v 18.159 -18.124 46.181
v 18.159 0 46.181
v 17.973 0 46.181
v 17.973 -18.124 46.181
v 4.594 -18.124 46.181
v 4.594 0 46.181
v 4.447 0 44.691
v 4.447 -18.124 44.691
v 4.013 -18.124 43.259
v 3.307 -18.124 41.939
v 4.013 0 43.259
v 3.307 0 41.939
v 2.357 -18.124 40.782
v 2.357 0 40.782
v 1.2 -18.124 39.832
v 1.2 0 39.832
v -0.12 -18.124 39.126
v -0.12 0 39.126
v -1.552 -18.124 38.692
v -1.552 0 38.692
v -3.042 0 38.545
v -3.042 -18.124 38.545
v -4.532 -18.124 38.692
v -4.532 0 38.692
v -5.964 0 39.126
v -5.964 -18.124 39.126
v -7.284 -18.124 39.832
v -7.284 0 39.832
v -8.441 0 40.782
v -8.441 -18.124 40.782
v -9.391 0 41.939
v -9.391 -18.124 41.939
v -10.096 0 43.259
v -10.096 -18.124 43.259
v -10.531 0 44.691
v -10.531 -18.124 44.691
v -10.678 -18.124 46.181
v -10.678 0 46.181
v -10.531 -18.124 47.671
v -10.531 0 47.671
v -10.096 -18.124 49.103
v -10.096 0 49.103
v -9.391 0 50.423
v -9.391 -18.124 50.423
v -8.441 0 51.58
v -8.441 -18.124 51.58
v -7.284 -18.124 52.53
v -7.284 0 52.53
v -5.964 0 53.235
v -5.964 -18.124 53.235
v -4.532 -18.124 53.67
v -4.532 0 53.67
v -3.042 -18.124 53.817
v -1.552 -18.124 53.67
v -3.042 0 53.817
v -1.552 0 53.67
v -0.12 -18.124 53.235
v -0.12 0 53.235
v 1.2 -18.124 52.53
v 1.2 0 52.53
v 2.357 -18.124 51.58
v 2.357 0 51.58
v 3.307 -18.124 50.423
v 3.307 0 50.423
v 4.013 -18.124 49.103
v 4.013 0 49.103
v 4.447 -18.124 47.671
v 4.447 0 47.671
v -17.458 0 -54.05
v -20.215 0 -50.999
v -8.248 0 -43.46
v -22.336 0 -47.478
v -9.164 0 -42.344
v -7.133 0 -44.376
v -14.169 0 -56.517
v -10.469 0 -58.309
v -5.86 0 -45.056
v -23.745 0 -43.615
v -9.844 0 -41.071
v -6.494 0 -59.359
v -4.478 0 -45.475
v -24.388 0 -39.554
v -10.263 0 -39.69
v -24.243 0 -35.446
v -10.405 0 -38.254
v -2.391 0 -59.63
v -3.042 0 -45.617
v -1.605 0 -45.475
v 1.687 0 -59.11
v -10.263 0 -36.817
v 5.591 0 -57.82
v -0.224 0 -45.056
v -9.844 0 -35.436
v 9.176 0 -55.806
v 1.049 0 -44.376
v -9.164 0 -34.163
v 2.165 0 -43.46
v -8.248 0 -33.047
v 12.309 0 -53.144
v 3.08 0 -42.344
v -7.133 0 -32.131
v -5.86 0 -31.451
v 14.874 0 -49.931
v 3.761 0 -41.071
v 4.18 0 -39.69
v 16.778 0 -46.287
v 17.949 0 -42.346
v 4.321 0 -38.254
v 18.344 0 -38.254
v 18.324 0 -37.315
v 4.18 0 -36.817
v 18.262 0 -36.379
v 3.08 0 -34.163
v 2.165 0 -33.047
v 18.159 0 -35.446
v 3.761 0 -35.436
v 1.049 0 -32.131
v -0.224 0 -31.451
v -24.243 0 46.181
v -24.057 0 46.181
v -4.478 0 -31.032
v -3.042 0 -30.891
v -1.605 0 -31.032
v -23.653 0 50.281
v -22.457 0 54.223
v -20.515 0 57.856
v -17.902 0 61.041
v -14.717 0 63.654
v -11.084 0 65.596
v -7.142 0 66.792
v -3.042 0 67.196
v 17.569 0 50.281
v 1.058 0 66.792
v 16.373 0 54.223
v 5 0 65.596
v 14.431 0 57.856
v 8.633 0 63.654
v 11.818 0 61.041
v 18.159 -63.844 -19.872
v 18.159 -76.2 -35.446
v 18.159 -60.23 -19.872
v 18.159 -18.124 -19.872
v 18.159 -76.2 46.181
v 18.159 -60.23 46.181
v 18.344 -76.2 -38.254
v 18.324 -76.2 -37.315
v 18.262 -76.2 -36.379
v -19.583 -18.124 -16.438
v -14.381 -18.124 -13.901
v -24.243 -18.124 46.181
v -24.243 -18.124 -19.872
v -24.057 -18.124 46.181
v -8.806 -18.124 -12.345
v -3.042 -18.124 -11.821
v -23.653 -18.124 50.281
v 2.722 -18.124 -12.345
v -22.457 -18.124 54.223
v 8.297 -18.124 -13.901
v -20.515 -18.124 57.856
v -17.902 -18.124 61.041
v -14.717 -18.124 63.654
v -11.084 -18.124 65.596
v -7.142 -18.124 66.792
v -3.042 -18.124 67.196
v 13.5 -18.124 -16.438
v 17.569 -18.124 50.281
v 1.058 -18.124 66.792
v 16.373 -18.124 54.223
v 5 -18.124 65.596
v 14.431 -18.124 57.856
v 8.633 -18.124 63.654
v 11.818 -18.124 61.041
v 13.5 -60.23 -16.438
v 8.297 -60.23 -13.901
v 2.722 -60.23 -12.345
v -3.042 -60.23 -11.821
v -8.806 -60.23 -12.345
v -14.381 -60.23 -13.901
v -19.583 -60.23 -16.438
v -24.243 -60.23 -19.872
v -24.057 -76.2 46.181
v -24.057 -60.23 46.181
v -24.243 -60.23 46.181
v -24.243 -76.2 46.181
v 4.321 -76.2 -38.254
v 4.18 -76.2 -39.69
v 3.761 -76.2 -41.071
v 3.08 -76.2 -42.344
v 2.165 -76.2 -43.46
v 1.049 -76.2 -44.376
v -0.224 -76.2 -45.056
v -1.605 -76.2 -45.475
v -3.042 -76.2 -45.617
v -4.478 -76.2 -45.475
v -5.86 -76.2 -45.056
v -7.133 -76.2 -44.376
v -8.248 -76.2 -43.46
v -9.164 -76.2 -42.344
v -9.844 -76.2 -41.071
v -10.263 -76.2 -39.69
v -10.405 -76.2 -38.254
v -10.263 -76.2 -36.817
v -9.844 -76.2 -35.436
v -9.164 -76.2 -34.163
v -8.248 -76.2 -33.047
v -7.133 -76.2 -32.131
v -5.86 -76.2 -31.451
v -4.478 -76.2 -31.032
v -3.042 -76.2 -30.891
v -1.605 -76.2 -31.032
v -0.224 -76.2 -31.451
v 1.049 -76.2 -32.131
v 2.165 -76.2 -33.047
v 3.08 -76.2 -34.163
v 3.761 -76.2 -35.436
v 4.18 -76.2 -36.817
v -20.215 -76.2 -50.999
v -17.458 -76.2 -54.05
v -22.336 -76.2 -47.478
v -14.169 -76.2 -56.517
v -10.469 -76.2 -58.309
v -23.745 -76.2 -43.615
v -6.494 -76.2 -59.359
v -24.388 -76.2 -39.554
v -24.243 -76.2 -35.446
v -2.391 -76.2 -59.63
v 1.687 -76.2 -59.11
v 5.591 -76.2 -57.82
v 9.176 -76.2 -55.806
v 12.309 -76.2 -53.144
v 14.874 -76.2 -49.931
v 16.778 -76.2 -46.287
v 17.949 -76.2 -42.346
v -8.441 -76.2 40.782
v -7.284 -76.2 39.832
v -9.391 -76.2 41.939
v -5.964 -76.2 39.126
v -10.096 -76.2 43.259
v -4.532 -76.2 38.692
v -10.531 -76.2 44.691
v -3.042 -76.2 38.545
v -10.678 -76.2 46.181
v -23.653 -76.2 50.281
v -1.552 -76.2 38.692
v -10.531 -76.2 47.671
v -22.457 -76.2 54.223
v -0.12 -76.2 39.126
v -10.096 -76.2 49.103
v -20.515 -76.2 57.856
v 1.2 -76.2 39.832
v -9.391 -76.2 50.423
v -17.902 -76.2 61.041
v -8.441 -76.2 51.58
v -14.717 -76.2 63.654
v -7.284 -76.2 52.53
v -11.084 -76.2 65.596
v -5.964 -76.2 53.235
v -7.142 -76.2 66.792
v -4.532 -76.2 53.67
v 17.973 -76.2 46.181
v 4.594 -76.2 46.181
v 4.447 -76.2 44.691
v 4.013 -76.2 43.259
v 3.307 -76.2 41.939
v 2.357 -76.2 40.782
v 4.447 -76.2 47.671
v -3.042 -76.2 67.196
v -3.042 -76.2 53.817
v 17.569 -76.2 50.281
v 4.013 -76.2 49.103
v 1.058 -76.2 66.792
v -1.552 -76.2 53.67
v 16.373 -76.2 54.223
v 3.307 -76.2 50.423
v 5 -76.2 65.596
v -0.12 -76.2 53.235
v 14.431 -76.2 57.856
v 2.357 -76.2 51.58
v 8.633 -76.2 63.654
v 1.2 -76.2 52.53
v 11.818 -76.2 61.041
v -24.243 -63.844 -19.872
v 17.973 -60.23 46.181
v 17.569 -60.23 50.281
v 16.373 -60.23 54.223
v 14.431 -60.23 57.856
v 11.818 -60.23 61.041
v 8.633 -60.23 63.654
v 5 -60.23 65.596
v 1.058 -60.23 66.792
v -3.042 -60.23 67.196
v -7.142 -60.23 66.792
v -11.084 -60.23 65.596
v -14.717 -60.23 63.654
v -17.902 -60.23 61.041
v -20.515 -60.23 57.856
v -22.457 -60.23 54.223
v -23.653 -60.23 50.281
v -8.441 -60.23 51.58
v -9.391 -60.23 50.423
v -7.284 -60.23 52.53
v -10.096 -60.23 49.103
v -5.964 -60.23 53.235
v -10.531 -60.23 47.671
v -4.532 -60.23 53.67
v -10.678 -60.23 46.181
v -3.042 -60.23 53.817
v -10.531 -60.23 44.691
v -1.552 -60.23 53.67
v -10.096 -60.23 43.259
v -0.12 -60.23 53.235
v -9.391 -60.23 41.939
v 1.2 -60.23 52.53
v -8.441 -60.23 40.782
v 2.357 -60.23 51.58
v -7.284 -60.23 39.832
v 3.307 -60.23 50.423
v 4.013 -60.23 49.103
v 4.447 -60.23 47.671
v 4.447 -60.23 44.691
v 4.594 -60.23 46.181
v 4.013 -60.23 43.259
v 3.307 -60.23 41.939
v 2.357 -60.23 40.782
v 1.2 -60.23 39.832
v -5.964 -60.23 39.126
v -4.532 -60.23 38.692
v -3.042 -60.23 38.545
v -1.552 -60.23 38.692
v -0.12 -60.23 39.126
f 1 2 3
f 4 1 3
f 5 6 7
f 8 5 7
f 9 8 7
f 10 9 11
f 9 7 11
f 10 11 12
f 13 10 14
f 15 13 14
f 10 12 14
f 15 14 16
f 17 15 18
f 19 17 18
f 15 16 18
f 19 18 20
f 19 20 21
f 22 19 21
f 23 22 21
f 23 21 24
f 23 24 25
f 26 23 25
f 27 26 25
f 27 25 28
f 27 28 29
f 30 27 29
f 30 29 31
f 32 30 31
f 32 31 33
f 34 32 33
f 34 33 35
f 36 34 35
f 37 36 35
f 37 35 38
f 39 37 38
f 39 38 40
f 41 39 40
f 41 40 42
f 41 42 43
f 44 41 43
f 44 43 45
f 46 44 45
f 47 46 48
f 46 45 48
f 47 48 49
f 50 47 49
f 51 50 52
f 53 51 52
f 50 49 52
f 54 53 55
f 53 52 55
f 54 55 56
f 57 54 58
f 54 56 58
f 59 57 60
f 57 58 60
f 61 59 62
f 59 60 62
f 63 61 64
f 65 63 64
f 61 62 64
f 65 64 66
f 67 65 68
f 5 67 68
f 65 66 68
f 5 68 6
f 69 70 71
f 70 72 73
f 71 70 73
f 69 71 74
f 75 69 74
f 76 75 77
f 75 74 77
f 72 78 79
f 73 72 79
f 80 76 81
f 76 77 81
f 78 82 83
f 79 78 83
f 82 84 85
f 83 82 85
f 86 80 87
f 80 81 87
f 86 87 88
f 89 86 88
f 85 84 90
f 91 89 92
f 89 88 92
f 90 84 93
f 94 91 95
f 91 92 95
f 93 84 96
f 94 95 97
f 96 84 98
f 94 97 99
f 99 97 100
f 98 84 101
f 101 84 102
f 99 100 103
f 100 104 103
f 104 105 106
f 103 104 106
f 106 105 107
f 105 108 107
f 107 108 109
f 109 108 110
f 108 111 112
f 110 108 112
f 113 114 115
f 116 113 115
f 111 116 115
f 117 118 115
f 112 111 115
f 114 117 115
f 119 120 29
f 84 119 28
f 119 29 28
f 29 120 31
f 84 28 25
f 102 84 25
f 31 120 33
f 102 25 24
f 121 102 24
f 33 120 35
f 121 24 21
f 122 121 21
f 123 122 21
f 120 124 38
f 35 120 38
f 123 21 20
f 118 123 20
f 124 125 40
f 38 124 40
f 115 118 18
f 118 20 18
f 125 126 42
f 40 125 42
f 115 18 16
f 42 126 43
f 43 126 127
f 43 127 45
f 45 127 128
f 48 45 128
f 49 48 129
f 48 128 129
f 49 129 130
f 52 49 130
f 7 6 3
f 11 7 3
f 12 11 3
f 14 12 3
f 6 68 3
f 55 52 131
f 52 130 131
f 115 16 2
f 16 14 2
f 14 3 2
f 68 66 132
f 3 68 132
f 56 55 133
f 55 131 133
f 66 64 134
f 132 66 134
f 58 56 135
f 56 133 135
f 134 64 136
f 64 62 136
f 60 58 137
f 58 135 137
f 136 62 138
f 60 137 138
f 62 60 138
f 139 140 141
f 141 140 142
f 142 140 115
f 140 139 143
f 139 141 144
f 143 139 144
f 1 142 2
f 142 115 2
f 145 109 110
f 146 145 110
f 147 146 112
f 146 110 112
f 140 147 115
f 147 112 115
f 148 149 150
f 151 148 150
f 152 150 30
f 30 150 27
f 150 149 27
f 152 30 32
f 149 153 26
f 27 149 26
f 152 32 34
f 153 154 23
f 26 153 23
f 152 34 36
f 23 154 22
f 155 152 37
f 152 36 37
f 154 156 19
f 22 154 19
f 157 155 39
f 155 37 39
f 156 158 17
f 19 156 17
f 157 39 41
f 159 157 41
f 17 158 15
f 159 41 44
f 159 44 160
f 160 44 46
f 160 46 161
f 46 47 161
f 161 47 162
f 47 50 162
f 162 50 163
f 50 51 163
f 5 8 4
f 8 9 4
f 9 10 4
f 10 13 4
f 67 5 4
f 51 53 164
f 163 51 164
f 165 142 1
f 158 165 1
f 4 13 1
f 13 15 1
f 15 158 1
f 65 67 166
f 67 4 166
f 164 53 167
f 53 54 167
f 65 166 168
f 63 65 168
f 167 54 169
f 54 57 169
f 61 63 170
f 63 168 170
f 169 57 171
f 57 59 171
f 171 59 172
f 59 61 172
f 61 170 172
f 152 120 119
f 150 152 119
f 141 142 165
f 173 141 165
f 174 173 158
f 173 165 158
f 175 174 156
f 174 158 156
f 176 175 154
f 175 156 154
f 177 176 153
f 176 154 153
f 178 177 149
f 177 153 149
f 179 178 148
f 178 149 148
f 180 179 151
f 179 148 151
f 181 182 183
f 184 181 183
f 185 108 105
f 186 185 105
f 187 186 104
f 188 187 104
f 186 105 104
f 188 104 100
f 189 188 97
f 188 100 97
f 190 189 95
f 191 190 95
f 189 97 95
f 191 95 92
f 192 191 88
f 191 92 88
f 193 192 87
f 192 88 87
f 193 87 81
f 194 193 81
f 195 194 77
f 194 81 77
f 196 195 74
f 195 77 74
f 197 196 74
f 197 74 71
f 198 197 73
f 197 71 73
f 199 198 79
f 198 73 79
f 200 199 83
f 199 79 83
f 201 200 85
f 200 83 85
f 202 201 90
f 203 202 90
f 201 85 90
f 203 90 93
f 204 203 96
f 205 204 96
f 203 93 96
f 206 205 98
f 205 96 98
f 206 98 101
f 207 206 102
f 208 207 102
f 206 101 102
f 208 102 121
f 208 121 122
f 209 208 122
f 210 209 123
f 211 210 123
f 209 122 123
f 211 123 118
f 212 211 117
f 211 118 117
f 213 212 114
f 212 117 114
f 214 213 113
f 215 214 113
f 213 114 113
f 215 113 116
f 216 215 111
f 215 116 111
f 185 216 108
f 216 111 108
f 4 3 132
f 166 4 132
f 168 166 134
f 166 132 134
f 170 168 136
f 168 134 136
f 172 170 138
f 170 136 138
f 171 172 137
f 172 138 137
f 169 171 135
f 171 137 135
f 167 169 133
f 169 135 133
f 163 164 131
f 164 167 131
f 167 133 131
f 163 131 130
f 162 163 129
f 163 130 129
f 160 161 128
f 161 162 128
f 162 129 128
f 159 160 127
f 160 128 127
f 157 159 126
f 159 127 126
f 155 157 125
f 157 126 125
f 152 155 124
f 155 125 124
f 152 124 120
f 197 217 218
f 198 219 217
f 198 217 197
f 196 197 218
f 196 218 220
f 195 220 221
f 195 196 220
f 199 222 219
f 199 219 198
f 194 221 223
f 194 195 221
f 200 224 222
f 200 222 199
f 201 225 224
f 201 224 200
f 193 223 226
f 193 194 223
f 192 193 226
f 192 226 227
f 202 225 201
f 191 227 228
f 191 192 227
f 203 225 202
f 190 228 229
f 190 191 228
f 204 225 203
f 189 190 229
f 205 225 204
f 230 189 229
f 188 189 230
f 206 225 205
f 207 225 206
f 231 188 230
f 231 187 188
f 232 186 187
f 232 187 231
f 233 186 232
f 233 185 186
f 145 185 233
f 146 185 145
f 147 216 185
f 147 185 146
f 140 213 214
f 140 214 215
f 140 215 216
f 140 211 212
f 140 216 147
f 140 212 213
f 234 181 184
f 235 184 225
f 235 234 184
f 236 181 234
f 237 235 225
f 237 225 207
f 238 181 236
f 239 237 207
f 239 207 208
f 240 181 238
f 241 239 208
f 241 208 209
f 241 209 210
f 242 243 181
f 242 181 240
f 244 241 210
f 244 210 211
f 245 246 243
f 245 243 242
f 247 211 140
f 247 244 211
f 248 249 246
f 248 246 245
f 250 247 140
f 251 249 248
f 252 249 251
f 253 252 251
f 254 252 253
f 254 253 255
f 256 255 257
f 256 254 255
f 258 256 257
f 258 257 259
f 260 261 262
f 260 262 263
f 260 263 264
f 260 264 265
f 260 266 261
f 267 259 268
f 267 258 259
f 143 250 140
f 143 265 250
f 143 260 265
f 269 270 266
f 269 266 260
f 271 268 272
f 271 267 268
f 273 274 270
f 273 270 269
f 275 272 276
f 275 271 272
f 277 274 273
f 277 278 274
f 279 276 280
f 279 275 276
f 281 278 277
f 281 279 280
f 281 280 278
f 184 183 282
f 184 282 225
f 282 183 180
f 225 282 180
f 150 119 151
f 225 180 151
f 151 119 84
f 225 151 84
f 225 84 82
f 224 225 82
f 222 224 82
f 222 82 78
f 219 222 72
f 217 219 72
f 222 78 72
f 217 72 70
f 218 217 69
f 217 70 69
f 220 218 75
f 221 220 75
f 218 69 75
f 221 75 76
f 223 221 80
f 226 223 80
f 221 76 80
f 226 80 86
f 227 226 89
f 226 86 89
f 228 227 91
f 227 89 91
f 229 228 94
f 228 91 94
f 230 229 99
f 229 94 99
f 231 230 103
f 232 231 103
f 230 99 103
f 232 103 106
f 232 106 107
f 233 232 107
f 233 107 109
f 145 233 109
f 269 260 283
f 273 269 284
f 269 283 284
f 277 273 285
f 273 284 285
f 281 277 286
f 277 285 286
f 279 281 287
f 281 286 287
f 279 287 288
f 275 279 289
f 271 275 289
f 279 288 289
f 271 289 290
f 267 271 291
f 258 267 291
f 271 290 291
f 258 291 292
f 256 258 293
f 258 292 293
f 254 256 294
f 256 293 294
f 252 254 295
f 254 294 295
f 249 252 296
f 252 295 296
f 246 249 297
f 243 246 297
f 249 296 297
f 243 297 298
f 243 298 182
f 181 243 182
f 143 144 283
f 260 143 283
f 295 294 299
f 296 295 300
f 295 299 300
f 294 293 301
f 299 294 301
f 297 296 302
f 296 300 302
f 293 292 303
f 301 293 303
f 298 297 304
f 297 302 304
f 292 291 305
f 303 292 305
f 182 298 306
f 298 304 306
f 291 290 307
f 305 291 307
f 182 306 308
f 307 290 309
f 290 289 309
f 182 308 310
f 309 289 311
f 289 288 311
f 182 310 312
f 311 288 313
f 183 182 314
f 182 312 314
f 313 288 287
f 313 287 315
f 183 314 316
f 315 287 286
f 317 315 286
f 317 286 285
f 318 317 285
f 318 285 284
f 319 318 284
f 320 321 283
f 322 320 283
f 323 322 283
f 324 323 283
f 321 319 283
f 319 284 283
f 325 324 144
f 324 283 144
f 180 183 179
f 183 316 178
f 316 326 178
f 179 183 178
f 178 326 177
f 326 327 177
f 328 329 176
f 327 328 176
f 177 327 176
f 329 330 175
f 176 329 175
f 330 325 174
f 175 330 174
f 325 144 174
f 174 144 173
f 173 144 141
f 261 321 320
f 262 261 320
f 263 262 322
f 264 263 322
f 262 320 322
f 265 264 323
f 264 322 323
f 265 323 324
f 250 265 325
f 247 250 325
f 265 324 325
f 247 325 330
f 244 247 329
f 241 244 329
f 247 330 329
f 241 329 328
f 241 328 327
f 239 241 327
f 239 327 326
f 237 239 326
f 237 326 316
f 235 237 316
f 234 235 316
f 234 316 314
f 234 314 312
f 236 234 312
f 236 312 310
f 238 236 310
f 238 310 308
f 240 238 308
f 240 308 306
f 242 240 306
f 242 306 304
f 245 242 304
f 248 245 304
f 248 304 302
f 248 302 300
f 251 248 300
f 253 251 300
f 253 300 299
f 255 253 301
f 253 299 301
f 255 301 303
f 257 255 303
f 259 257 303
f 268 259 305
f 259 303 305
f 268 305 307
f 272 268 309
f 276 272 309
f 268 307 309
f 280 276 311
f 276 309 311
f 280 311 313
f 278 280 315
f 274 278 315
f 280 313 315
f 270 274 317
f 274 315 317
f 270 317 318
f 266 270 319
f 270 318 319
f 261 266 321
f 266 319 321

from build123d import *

# Parameters (mm, degrees)
F1_DEPTH = 76.2
F2_W     = 42.1064179391
F2_H     = 26.5092402697
F2_H_2   = 66.0529509187
F3_DEPTH = 127
F5_DEPTH = 45.72


with BuildPart() as f1:
    # F0 (on Front) → F1 (new body)
    with BuildSketch(Plane.XZ):
        with BuildLine():
            ThreePointArc((-10.6776429778, 46.1808890104), (-3.0418550596, 53.8166769287), (4.5939328587, 46.1808890104))
            Line((4.5939328587, 46.1808890104), (17.9729815764, 46.1808890104))
            ThreePointArc((17.9729815764, 46.1808890104), (-3.0418550596, 67.1957256464), (-24.0566916955, 46.1808890104))
            Line((-24.0566916955, 46.1808890104), (-10.6776429778, 46.1808890104))
        make_face()
        with BuildLine():
            Line((17.9729815764, 46.1808890104), (4.5939328587, 46.1808890104))
            ThreePointArc((4.5939328587, 46.1808890104), (-3.0418550596, 38.5451010922), (-10.6776429778, 46.1808890104))
            Line((-10.6776429778, 46.1808890104), (-24.0566916955, 46.1808890104))
            ThreePointArc((-24.0566916955, 46.1808890104), (-3.0418550596, 25.1660523745), (17.9729815764, 46.1808890104))
        make_face()
        with BuildLine():
            Line((18.1589517742, 46.1808890104), (17.9729815764, 46.1808890104))
            ThreePointArc((17.9729815764, 46.1808890104), (-3.0418550596, 25.1660523745), (-24.0566916955, 46.1808890104))
            Line((-24.0566916955, 46.1808890104), (-24.2426618934, 46.1808890104))
            Line((-24.2426618934, 46.1808890104), (-24.2426618934, -35.4456115543))
            ThreePointArc((-24.2426618934, -35.4456115543), (-3.0418550596, -16.8676737579), (18.1589517742, -35.4456115543))
            Line((18.1589517742, -35.4456115543), (18.1589517742, 46.1808890104))
        make_face()
        with BuildLine():
            Line((18.1589517742, -38.2536314428), (18.1589517742, -35.4456115543))
            ThreePointArc((18.1589517742, -35.4456115543), (-3.0418550596, -16.8676737579), (-24.2426618934, -35.4456115543))
            Line((-24.2426618934, -35.4456115543), (-24.2426618934, -38.2536314428))
            Line((-24.2426618934, -38.2536314428), (-10.4049137752, -38.2536314428))
            ThreePointArc((-10.4049137752, -38.2536314428), (-3.0418550596, -30.8905727272), (4.321203656, -38.2536314428))
            Line((4.321203656, -38.2536314428), (18.1589517742, -38.2536314428))
        make_face()
        with BuildLine():
            ThreePointArc((18.3441026253, -38.2536314428), (18.2977647113, -36.8465727614), (18.1589517742, -35.4456115543))
            Line((18.1589517742, -35.4456115543), (18.1589517742, -38.2536314428))
            Line((18.1589517742, -38.2536314428), (4.321203656, -38.2536314428))
            ThreePointArc((4.321203656, -38.2536314428), (-3.0418550596, -45.6166901584), (-10.4049137752, -38.2536314428))
            Line((-10.4049137752, -38.2536314428), (-24.2426618934, -38.2536314428))
            Line((-24.2426618934, -38.2536314428), (-24.2426618934, -35.4456115543))
            ThreePointArc((-24.2426618934, -35.4456115543), (-4.448913741, -59.5932512137), (18.3441026253, -38.2536314428))
        make_face()
    extrude(amount=F1_DEPTH)

    # F2 (on face) → F3 (cut)
    with BuildSketch(Plane.YZ.offset(18.1589517742)):
        with Locations((-39.1769716516, 59.4355091453)):
            Rectangle(F2_W, F2_H)
        with Locations((-39.1769716516, 13.1544135511)):
            Rectangle(F2_W, F2_H_2)
    extrude(amount=-F3_DEPTH, mode=Mode.SUBTRACT)

    # F4 (on face) → F5 (join)
    with BuildSketch(Plane.XZ.offset(18.1237626821)):
        with BuildLine():
            Line((-24.2426618934, -19.8720619082), (18.1589517742, -19.8720619082))
            ThreePointArc((18.1589517742, -19.8720619082), (-3.0418550596, -11.8207453955), (-24.2426618934, -19.8720619082))
        make_face()
    extrude(amount=F5_DEPTH)


solid = f1.part
